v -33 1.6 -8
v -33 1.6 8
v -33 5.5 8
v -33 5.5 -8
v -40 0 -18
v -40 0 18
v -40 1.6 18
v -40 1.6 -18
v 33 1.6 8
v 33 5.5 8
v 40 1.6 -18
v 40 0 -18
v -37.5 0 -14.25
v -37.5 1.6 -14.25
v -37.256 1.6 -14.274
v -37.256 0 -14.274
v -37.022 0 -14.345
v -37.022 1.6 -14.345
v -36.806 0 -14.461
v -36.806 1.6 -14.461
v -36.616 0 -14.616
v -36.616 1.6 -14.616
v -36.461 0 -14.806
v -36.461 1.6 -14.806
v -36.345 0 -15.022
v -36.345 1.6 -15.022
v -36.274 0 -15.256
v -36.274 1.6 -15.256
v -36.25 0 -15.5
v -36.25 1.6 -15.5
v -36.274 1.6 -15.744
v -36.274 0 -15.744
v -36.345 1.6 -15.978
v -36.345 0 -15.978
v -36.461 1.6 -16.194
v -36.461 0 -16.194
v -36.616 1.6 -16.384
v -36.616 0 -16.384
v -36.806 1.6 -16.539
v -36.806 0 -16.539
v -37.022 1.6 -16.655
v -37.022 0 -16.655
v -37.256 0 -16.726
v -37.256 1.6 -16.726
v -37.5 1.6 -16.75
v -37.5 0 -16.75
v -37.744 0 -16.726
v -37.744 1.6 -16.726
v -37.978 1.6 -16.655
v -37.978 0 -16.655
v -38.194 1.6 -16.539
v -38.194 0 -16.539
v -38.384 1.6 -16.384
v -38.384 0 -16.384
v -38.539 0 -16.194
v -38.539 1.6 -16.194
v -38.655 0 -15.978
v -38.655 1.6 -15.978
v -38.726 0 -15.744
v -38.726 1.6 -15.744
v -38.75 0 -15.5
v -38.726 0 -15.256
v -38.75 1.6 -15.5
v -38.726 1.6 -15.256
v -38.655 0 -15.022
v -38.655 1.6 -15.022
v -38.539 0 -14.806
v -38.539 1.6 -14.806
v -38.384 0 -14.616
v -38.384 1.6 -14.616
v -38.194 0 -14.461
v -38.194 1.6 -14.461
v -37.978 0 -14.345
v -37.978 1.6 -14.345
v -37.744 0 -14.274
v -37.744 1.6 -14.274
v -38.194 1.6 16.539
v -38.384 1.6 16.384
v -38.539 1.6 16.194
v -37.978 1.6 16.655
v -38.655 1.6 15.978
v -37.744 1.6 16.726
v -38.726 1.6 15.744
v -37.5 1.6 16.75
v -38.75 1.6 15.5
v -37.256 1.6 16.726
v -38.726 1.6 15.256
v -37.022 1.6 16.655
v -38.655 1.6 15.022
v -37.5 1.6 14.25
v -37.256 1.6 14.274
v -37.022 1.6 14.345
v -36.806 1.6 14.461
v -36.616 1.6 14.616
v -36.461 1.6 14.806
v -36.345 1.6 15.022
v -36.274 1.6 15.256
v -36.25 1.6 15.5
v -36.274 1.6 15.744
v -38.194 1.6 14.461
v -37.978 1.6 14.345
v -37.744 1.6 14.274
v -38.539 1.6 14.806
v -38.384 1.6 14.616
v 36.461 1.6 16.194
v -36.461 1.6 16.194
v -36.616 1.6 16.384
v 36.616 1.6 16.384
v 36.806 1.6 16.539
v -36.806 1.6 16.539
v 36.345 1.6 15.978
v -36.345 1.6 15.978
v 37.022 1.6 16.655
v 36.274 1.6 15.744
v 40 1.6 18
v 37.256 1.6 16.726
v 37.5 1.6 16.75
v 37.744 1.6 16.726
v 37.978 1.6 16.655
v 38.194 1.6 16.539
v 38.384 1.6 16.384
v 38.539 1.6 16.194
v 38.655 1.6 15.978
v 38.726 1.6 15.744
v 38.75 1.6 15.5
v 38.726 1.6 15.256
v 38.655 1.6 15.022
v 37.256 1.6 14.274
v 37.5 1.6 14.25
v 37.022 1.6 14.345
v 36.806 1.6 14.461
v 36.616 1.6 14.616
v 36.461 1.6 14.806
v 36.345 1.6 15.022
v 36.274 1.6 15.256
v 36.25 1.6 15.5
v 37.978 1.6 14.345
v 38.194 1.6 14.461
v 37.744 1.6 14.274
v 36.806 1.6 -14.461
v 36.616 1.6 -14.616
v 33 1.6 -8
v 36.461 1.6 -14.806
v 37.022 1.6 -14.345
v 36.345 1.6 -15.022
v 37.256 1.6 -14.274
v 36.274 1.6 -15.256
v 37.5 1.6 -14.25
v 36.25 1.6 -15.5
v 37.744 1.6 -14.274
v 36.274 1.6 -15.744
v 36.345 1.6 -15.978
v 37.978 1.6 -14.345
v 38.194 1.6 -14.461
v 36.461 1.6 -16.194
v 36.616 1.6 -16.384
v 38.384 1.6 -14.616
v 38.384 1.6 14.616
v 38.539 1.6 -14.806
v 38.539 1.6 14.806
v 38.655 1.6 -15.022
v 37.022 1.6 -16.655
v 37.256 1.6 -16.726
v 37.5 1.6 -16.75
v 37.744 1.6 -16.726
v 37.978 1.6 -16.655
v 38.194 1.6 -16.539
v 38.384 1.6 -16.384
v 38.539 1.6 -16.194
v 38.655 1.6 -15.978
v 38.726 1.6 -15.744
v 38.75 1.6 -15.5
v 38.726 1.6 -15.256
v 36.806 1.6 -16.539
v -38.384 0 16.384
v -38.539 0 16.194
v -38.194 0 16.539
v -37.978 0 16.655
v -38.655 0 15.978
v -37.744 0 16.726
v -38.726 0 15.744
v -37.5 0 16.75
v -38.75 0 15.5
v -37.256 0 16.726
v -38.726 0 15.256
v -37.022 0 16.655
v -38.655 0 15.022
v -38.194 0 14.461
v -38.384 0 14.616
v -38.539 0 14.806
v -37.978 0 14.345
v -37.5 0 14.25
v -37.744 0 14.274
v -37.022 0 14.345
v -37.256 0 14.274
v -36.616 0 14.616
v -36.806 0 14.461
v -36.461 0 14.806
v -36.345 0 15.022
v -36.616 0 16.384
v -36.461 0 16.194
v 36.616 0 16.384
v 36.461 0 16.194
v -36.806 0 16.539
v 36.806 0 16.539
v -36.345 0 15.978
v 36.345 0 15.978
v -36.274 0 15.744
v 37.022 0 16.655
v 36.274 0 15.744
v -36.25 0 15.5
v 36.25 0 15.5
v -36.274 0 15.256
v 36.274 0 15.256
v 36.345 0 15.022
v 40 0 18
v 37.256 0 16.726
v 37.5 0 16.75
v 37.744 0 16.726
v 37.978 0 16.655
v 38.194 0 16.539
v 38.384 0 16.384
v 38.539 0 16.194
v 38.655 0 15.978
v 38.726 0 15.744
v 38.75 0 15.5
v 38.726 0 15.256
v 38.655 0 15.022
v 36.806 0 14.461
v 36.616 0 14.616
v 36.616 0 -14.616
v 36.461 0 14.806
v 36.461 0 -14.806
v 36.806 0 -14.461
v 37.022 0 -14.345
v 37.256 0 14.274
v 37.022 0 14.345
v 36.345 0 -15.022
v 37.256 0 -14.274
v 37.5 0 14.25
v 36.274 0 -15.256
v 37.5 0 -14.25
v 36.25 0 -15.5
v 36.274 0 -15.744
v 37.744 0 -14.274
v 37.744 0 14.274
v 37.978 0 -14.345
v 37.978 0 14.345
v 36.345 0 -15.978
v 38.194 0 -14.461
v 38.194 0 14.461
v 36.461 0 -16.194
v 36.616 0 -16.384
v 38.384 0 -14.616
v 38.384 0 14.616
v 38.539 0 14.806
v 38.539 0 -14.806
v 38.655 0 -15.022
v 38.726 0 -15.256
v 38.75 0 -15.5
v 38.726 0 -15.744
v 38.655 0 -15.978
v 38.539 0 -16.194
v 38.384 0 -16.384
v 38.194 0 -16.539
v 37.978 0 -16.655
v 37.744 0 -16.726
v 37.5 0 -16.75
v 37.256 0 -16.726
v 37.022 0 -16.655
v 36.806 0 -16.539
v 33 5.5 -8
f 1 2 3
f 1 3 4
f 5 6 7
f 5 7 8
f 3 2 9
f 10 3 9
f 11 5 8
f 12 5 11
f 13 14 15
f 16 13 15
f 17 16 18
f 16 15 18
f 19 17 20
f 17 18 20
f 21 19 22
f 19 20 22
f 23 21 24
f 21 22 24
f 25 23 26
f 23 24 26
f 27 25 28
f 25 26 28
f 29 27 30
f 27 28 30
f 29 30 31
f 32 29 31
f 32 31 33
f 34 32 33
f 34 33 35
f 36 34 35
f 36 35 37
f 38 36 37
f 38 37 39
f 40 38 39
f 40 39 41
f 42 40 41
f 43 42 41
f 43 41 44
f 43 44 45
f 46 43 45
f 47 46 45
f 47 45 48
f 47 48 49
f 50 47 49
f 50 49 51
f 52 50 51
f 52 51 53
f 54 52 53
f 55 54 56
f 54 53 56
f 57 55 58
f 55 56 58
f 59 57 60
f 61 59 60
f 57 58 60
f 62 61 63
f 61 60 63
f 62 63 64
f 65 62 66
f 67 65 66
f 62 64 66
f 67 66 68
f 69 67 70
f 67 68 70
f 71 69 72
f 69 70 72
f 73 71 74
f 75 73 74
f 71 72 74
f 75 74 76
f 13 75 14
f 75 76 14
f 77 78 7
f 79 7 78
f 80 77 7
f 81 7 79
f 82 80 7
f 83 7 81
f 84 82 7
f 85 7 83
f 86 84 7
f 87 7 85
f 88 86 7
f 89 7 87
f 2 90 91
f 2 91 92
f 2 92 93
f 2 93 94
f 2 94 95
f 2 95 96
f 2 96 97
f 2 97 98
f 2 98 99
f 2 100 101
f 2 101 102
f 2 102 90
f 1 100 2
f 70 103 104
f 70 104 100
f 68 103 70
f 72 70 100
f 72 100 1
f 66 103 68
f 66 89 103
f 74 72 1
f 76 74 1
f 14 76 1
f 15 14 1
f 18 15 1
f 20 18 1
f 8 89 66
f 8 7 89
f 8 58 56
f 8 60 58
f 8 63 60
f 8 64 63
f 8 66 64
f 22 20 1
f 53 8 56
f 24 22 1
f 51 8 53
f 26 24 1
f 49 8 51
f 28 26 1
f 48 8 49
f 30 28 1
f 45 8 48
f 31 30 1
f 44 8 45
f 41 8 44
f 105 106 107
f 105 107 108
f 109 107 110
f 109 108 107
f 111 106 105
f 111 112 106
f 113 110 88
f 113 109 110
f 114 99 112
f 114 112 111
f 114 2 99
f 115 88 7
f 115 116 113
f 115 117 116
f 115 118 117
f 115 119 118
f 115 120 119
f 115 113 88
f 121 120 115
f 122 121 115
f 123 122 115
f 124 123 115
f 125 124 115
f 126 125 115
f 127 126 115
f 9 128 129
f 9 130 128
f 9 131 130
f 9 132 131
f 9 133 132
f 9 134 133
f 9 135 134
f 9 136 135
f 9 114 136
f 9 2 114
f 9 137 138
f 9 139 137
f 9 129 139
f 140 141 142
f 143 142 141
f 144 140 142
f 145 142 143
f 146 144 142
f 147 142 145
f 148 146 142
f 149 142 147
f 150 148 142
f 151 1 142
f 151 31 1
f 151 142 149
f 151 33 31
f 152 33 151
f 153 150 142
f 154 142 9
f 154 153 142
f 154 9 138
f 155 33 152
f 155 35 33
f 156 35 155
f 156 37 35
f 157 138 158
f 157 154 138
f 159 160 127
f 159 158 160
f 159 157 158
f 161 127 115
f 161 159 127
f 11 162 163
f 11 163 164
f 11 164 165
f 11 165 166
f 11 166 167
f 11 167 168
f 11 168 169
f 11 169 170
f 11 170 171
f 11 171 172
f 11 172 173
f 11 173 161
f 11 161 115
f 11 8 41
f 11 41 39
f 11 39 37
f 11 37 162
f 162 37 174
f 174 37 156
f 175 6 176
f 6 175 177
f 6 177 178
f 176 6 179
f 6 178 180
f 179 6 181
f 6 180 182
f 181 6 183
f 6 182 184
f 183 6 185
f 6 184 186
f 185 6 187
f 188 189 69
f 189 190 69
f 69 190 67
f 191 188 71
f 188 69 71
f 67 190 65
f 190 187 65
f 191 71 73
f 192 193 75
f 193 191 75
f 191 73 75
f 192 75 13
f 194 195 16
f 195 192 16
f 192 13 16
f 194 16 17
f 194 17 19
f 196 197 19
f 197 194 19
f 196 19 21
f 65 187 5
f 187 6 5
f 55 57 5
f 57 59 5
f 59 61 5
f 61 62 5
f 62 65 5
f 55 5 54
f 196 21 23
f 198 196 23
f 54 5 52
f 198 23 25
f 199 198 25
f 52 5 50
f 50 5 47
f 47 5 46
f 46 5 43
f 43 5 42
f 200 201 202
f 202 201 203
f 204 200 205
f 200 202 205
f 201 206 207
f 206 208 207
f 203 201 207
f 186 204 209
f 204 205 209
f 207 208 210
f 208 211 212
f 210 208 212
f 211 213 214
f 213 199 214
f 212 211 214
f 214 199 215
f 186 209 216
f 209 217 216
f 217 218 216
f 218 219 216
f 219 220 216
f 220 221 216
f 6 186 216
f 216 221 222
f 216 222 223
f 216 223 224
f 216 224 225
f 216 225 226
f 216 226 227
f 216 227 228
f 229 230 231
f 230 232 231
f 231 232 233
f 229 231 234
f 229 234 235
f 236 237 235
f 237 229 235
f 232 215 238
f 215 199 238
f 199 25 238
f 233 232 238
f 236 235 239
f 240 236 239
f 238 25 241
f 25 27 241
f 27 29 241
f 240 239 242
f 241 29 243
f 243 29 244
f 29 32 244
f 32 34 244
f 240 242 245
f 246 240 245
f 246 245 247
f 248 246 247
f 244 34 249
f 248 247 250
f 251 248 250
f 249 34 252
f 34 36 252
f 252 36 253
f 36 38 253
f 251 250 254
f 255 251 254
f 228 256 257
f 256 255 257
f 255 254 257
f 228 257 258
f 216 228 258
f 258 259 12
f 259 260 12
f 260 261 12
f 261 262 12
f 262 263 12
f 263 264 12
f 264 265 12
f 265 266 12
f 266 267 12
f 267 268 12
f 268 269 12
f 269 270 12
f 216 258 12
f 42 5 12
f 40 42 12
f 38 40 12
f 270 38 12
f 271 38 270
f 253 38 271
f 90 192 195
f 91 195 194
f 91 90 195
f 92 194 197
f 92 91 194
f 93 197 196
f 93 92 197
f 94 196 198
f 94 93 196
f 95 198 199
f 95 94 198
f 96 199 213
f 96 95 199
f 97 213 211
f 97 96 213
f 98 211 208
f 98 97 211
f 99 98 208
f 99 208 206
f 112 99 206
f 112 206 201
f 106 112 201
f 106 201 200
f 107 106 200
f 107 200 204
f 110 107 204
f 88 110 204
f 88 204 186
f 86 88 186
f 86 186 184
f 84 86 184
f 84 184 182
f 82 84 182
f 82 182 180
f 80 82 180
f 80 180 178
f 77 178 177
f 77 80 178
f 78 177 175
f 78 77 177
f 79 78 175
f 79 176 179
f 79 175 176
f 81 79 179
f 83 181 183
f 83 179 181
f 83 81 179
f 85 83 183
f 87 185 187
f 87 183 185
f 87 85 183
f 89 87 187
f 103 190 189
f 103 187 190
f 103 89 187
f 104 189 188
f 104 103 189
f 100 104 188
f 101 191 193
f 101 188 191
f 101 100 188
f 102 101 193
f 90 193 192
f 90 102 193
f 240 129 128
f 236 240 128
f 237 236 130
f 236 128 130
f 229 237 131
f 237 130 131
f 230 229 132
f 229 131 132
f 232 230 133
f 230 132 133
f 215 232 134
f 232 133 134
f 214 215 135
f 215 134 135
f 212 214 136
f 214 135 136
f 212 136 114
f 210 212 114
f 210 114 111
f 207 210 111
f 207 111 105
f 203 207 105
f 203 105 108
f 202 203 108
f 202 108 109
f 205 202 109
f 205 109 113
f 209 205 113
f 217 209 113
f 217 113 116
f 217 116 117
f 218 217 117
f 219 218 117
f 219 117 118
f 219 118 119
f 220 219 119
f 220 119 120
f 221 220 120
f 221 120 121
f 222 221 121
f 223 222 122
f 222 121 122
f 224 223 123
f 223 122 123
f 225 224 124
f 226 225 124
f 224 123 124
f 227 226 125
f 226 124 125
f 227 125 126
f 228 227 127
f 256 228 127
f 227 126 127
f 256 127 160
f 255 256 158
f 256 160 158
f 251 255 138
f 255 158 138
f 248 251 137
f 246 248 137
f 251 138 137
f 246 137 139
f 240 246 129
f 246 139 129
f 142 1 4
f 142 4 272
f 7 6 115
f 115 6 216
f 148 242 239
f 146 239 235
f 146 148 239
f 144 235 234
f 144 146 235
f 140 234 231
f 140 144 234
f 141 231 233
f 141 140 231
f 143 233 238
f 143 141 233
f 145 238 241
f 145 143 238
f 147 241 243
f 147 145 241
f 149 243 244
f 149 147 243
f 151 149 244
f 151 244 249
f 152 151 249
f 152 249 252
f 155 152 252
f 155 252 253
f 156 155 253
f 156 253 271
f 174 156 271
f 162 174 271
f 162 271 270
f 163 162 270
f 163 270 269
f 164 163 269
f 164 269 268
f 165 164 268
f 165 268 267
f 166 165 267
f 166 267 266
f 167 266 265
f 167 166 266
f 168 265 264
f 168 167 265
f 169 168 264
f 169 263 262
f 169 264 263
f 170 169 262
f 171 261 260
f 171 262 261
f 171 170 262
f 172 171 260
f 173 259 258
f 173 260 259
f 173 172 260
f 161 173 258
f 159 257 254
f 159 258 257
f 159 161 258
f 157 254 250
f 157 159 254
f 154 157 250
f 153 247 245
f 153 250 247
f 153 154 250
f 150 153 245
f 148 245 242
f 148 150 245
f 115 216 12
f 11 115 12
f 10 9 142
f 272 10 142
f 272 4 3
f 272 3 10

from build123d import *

# Parameters (mm, degrees)
SKETCH1_W               = 80
SKETCH1_H               = 36
BOSS_EXTRUDE1_DEPTH     = 1.6
SKETCH3_W               = 66
SKETCH3_H               = 16
BOSS_EXTRUDE2_DEPTH     = 3.9
SKETCH4_R               = 1.25
CUT_EXTRUDE1_DEPTH      = 4.9
MIRROR3_COPY_1_SKETCH_R = 1.25
MIRROR3_COPY_1_DEPTH    = 4.9


with BuildPart() as part:
    # Sketch1 → Boss-Extrude1 (new body)
    with BuildSketch(Plane(origin=(0, 0, 0), x_dir=(1, 0, 0), z_dir=(0, 1, 0))):
        Rectangle(SKETCH1_W, SKETCH1_H)
    extrude(amount=BOSS_EXTRUDE1_DEPTH)

    # Sketch3 → Boss-Extrude2 (add)
    with BuildSketch(Plane(origin=(0, 1.6, 0), x_dir=(1, 0, 0), z_dir=(0, 1, 0))):
        Rectangle(SKETCH3_W, SKETCH3_H)
    extrude(amount=BOSS_EXTRUDE2_DEPTH)

    # Sketch4 → Cut-Extrude1 (cut)
    with BuildSketch(Plane(origin=(0, 1.6, 0), x_dir=(1, 0, 0), z_dir=(0, 1, 0))):
        with Locations(Location((-37.5, 15.5, 0), (0, 0, 270))):
            Circle(SKETCH4_R)
    cut_extrude1 = extrude(amount=-CUT_EXTRUDE1_DEPTH, mode=Mode.SUBTRACT)

    # Mirror2: Cut-Extrude1 across plane
    add(cut_extrude1.mirror(Plane.ZY), mode=Mode.SUBTRACT)

    # Mirror3: Cut-Extrude1 across plane
    add(cut_extrude1.mirror(Plane.XY), mode=Mode.SUBTRACT)

    # Mirror3 copy 1 sketch → Mirror3 copy 1 (cut)
    with BuildSketch(Plane(origin=(0, 1.6, 0), x_dir=(-1, 0, 0), z_dir=(0, 1, 0))):
        with Locations(Location((-37.5, 15.5, 0), (0, 0, 270))):
            Circle(MIRROR3_COPY_1_SKETCH_R)
    extrude(amount=-MIRROR3_COPY_1_DEPTH, mode=Mode.SUBTRACT)


solid = part.part
